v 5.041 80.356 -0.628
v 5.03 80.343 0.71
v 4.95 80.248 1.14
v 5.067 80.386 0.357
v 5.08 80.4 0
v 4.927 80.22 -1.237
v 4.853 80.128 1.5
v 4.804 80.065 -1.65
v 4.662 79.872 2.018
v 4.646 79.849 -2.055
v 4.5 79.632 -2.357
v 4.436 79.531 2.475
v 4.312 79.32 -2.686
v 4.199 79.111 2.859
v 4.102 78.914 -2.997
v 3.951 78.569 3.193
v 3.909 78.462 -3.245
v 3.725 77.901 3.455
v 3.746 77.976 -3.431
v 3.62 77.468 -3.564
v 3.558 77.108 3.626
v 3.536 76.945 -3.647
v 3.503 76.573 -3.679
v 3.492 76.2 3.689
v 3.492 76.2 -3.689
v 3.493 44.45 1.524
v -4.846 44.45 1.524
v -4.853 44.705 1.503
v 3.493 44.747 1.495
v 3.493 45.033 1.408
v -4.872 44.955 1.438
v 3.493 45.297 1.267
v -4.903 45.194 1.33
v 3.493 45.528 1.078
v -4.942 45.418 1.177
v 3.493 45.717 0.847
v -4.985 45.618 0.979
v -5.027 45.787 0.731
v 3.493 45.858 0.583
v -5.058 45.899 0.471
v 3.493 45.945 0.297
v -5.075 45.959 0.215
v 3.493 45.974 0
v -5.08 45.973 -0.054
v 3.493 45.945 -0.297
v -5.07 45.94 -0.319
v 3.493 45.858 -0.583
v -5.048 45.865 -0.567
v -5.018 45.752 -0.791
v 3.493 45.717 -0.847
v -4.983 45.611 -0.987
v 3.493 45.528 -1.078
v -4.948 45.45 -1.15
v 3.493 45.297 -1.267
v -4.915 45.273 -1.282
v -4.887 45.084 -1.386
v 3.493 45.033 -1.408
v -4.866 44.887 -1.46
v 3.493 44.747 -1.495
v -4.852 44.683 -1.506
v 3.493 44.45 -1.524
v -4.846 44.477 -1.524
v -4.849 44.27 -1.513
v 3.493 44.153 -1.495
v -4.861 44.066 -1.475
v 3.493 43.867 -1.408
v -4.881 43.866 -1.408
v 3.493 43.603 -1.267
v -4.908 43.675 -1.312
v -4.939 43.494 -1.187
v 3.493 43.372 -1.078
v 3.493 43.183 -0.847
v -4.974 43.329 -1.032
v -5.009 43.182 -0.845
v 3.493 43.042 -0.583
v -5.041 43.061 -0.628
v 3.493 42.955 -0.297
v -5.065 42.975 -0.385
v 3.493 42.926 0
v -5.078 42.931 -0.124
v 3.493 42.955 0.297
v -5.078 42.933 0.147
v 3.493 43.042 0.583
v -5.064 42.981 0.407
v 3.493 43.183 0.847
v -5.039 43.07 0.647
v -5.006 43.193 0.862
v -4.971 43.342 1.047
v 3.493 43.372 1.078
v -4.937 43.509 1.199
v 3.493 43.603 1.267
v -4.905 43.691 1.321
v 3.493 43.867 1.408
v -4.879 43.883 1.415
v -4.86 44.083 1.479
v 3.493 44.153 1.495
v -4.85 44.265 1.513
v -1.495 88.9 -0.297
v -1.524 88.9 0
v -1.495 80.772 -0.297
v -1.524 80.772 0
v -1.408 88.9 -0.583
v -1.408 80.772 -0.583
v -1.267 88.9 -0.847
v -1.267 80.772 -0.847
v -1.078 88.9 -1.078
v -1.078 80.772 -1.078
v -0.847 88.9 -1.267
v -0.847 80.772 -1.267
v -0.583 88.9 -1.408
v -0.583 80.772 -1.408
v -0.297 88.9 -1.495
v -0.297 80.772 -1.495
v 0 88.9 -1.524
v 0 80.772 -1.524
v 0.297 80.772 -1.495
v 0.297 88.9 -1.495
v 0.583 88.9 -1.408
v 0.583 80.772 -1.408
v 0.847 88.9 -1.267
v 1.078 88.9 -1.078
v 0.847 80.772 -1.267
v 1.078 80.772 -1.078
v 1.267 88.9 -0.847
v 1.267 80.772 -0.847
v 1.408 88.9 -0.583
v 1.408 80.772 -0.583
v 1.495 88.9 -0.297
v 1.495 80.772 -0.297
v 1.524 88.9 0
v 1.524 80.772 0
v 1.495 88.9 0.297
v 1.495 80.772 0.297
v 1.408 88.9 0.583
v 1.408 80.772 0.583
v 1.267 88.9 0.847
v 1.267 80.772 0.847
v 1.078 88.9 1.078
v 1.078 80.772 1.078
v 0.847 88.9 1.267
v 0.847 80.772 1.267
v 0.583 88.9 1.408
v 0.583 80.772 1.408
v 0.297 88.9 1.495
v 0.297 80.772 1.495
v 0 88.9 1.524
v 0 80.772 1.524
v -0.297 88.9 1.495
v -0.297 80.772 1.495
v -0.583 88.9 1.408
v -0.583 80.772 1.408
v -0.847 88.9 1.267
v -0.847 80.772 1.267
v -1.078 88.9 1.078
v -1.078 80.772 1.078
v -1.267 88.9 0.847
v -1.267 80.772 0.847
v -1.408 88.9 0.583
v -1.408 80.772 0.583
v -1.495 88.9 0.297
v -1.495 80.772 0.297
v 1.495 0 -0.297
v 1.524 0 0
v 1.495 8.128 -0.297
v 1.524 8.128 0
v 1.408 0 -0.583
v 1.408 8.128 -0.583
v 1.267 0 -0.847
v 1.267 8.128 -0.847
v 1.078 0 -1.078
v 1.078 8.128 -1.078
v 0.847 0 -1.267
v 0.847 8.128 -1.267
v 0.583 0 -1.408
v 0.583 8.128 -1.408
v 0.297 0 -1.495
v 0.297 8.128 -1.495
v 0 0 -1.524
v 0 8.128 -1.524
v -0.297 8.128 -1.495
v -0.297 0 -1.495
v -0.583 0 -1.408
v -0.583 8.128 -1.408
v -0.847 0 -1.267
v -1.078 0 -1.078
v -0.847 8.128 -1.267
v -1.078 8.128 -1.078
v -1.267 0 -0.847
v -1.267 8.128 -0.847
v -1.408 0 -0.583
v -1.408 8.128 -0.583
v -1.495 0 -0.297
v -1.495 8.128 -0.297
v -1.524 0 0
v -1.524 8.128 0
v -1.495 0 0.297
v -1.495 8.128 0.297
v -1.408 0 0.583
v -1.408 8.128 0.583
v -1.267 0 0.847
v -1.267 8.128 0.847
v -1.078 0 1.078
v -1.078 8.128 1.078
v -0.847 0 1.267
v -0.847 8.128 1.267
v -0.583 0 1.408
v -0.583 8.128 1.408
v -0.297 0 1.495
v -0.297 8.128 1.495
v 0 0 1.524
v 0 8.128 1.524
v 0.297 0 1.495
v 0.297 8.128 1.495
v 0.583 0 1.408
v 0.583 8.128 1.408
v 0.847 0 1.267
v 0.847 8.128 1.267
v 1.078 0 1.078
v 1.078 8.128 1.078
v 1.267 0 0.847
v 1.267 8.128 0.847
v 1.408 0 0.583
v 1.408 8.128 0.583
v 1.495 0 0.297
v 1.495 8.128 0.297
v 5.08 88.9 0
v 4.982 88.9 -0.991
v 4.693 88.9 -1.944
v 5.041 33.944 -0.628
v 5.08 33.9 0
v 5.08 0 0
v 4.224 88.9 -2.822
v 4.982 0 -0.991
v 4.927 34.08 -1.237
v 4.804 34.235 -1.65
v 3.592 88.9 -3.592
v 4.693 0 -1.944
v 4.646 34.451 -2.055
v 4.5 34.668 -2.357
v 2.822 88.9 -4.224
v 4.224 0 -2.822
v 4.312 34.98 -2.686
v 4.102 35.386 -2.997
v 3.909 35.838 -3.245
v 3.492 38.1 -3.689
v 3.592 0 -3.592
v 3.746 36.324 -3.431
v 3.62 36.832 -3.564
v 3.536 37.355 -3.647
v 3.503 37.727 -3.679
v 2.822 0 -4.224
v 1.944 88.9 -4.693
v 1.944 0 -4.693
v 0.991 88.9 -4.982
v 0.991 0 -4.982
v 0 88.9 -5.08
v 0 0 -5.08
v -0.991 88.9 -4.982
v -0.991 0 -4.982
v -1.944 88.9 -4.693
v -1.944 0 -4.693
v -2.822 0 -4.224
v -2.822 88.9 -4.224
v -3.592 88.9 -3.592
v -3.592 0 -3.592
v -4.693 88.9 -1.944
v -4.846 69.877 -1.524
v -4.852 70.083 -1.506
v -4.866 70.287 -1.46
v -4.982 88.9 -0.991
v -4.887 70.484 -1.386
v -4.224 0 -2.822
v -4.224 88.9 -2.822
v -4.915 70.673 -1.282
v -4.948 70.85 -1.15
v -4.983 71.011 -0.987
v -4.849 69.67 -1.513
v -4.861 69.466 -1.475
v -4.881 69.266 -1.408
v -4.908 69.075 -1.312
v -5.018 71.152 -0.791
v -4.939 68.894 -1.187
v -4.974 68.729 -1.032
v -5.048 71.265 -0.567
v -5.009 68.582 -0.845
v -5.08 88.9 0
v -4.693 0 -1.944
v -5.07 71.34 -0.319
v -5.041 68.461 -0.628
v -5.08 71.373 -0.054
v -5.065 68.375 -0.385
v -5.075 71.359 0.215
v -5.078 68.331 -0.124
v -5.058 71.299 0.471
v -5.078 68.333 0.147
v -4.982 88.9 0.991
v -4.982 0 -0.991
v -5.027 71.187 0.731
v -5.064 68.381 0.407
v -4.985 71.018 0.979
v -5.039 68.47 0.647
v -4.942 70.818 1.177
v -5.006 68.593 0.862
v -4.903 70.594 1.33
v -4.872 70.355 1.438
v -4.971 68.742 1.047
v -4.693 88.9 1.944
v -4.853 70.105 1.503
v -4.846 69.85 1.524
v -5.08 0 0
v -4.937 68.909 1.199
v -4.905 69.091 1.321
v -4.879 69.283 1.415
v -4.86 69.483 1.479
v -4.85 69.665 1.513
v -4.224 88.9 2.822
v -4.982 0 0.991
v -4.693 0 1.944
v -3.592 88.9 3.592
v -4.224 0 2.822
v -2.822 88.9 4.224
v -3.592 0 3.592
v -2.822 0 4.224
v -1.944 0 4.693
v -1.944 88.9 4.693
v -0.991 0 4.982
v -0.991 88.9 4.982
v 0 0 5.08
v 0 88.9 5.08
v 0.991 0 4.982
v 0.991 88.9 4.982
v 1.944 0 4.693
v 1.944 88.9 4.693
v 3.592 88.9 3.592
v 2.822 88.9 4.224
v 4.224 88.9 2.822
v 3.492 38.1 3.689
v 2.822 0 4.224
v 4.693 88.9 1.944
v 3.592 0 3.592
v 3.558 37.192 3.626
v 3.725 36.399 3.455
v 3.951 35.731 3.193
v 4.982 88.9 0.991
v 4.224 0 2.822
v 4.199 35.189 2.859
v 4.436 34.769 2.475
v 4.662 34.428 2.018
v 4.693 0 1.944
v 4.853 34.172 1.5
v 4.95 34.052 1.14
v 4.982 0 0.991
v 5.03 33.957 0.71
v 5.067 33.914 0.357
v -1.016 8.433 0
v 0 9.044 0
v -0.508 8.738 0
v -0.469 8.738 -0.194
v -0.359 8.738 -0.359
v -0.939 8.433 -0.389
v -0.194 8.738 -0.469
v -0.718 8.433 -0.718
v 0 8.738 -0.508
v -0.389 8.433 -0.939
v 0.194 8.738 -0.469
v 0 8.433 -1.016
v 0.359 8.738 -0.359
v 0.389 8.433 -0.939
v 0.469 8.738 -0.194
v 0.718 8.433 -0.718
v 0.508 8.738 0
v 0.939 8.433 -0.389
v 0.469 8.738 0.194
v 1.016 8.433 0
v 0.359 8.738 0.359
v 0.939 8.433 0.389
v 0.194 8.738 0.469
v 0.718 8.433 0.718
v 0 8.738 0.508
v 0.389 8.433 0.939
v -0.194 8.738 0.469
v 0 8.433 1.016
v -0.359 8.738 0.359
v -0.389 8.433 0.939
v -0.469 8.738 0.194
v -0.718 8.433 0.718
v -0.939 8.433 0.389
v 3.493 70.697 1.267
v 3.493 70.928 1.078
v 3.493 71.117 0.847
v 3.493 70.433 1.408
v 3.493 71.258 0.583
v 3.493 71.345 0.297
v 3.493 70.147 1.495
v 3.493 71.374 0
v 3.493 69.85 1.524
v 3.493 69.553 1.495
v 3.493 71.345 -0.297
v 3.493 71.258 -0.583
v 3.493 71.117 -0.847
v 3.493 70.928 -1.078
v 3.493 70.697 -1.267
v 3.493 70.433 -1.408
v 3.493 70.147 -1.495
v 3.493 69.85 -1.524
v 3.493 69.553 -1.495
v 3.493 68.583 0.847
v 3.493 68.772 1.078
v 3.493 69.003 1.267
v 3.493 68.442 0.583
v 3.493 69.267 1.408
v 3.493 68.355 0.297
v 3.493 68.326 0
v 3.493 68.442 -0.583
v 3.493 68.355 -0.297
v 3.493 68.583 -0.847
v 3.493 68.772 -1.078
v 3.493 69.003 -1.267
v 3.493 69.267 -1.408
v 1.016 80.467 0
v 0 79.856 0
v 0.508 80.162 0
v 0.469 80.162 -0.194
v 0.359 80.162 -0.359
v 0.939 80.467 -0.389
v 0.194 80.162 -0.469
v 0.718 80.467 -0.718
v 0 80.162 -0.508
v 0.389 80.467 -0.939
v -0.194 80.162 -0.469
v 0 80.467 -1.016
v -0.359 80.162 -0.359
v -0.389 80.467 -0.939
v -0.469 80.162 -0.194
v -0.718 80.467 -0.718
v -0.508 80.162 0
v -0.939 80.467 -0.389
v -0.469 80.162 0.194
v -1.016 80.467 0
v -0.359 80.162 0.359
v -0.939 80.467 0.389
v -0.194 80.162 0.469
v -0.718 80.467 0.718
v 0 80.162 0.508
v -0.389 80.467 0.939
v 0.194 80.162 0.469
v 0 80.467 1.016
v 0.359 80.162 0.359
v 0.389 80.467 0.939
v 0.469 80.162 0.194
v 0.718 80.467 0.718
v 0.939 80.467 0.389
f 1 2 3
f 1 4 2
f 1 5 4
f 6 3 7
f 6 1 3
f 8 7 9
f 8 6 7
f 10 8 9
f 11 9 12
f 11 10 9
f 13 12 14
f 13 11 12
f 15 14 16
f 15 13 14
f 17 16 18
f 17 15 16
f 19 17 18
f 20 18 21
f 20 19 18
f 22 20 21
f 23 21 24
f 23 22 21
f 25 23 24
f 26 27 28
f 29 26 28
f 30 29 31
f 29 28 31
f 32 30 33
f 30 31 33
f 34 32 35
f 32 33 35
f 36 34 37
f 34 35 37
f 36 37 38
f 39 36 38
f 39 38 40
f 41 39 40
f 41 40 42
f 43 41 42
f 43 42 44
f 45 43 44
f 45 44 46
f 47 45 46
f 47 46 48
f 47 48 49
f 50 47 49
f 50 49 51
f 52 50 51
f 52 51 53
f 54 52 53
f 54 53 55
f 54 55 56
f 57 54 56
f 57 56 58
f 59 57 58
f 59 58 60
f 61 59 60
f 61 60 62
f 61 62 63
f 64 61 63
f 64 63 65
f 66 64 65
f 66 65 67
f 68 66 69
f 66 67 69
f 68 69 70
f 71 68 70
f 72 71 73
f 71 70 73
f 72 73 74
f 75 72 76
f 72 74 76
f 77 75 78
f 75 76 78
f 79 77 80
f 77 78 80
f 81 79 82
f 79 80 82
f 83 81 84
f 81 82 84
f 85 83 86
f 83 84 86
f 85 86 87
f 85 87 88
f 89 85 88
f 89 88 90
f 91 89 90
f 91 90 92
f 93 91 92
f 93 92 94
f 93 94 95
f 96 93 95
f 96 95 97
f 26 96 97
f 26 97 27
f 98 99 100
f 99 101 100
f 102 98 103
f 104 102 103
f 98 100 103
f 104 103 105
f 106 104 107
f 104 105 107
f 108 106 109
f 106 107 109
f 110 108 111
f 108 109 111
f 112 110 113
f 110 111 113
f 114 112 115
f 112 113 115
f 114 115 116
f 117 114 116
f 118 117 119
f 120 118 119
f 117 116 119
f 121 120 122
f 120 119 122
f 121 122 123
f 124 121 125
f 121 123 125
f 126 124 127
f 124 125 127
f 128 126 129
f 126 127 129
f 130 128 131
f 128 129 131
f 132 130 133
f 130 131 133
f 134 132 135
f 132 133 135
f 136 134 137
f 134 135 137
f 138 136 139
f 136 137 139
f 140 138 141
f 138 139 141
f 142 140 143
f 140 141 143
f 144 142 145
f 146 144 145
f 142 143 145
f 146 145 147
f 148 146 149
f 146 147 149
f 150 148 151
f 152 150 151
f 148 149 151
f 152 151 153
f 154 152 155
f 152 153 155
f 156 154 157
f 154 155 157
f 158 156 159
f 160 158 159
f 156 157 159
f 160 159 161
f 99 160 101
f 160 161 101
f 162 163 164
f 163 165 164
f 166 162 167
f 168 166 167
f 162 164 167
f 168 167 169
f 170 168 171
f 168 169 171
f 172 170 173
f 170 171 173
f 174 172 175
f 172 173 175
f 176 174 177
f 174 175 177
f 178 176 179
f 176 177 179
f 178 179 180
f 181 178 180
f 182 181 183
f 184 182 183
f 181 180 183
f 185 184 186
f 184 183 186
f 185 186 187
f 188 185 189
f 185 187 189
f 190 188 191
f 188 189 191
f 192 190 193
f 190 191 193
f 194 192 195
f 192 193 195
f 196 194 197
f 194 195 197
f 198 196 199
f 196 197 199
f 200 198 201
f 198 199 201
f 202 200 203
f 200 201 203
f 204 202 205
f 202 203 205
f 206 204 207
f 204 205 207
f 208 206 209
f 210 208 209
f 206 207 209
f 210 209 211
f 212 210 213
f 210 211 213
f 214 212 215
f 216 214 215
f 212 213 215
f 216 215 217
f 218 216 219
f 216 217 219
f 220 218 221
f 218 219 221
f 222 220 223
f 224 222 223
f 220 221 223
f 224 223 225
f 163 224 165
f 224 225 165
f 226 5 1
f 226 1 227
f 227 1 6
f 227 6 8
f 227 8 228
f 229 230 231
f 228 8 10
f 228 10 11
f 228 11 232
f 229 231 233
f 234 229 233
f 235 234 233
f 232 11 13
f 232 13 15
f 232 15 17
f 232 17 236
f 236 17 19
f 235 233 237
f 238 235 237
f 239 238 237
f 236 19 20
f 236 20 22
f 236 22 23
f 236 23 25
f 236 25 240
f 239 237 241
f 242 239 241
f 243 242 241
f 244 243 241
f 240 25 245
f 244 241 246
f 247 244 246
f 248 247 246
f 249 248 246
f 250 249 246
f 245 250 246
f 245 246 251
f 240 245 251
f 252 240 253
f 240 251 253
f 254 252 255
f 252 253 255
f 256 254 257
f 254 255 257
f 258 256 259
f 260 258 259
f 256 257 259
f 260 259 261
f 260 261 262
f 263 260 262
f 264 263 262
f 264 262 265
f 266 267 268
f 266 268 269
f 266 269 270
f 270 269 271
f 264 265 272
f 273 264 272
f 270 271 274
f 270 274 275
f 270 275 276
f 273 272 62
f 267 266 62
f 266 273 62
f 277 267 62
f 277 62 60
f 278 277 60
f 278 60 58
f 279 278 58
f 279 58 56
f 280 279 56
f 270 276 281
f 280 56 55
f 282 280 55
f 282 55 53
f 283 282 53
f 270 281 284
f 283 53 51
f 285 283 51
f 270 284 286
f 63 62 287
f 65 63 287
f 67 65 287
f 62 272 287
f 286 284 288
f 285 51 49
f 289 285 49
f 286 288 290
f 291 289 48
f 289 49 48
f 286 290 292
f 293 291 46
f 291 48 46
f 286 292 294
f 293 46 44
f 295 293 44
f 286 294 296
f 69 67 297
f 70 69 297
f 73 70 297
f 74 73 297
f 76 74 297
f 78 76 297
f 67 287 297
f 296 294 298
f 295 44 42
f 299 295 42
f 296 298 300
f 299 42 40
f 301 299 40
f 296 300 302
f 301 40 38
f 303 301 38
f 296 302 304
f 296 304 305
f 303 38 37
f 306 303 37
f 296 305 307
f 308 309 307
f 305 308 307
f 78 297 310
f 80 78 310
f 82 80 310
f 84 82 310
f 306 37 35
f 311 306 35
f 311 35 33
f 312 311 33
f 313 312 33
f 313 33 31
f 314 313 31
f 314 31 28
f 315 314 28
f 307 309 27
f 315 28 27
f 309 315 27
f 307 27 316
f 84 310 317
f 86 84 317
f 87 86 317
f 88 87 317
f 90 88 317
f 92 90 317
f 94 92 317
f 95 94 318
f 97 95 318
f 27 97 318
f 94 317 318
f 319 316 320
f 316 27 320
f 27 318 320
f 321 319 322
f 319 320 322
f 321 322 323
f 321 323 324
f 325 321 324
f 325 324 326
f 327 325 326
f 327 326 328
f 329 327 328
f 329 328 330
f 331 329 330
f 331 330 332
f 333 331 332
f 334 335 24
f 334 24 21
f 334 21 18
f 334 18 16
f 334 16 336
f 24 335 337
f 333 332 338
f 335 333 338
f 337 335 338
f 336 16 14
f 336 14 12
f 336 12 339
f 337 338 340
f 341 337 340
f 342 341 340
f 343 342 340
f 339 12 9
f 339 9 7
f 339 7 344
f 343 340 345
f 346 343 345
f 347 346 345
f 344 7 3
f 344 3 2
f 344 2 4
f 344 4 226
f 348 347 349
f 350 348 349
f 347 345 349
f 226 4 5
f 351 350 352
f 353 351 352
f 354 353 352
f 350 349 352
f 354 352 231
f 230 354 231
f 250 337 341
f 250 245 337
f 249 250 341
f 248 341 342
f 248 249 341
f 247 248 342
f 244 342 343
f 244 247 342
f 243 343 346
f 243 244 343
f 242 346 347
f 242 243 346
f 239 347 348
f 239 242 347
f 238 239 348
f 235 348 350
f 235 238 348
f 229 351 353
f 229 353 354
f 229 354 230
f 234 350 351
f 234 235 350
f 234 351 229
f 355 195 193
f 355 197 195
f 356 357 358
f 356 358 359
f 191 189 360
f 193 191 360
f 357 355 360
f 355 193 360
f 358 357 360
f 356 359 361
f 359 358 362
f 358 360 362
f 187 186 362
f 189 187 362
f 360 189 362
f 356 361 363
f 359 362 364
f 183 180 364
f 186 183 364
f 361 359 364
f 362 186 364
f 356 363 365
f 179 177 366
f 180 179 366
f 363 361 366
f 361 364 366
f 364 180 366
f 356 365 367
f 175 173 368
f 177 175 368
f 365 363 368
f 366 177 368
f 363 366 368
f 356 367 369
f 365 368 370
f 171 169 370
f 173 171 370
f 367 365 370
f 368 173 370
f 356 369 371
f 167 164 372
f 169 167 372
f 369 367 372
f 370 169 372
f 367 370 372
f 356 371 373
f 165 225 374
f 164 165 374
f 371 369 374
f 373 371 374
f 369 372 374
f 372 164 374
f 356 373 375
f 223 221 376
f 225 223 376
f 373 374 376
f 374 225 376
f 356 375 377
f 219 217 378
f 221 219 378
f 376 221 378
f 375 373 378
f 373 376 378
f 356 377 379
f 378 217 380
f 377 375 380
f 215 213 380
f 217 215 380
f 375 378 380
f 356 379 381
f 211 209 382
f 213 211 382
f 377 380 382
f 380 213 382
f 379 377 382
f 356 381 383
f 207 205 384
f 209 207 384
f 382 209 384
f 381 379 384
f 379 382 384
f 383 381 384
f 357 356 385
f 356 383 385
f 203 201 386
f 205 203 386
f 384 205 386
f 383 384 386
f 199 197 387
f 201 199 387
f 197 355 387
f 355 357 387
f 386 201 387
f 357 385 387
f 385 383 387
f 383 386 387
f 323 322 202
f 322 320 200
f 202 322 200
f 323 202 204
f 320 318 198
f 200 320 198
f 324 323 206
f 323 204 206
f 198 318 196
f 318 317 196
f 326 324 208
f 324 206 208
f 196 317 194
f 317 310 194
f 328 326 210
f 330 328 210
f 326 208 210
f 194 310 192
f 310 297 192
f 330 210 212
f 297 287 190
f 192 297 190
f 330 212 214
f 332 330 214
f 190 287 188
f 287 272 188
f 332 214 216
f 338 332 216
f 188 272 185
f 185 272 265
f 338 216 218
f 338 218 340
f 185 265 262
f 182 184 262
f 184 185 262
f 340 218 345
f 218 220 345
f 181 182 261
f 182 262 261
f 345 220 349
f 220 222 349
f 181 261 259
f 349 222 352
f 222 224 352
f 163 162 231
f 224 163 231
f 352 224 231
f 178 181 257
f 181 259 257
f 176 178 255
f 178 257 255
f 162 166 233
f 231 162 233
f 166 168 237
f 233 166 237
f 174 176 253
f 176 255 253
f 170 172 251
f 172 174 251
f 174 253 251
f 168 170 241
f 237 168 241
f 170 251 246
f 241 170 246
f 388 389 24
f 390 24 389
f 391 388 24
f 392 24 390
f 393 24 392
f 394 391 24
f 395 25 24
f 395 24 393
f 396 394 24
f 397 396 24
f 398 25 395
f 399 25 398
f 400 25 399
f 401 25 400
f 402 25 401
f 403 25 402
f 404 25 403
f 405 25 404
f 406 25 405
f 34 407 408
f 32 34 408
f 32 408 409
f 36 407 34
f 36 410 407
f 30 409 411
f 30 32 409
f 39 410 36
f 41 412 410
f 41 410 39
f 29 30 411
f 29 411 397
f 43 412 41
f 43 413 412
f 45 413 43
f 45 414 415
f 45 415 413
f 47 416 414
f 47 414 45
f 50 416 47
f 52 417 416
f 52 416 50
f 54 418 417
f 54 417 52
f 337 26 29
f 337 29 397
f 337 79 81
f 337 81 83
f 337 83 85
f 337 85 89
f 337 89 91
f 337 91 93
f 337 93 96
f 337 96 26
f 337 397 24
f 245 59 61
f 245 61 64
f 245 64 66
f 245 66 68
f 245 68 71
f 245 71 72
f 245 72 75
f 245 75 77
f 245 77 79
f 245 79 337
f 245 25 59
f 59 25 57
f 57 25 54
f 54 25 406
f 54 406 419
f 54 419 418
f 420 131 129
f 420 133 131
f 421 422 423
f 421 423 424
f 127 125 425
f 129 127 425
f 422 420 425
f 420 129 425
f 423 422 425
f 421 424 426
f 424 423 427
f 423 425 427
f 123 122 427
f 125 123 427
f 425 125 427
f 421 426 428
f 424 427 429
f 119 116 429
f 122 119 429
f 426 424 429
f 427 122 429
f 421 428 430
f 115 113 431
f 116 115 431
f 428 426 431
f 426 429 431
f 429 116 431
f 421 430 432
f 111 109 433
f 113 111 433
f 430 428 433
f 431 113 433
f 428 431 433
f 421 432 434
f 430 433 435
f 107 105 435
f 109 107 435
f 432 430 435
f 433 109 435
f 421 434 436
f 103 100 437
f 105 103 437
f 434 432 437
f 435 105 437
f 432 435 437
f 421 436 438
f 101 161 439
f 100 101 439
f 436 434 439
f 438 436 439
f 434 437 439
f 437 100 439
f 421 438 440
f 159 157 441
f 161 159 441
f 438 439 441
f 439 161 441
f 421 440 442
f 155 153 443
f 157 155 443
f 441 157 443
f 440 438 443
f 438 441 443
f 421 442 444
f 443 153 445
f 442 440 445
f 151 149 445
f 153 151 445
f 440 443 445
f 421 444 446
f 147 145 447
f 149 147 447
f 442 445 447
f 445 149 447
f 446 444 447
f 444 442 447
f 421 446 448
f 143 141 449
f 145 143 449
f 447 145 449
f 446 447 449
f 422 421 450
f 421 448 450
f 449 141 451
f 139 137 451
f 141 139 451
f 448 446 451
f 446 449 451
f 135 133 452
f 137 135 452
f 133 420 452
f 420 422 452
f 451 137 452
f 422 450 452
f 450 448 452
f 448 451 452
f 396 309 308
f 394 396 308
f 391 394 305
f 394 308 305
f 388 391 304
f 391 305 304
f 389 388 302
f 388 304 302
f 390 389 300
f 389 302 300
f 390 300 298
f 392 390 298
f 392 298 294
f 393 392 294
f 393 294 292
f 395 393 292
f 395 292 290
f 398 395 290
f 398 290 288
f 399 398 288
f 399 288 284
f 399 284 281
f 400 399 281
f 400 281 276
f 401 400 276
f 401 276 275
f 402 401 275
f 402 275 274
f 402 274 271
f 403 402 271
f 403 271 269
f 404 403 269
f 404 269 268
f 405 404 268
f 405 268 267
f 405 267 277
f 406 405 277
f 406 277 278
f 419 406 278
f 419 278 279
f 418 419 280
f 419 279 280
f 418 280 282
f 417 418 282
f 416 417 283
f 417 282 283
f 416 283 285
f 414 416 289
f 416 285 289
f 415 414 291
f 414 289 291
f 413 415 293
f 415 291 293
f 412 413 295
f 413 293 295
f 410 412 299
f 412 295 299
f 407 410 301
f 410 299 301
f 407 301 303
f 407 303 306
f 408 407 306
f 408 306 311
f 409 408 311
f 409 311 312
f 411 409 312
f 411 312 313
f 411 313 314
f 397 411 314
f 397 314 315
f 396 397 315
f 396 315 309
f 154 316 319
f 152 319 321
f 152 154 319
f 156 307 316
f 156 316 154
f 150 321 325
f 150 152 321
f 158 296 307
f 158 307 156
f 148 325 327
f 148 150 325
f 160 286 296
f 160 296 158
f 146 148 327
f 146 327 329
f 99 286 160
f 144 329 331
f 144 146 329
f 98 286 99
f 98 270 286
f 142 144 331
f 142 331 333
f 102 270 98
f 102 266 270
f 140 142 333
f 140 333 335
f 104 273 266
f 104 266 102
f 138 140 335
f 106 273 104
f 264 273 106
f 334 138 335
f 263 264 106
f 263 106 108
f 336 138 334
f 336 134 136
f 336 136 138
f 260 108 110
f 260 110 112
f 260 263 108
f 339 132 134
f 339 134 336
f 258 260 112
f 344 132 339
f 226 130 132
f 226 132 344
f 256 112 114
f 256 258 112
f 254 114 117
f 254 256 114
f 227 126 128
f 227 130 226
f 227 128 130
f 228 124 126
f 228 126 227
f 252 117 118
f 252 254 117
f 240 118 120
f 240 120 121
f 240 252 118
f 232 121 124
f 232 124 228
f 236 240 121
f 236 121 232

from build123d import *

# Parameters (mm, degrees)
SKETCH1_R                            = 5.08
BOSS_EXTRUDE1_DEPTH                  = 88.9
TAPPED_HOLE_FOR_4_40_HELICOIL1_D     = 3.048
TAPPED_HOLE_FOR_4_40_HELICOIL1_DEPTH = 8.128
TAPPED_HOLE_FOR_4_40_HELICOIL1_TIP   = 0.915711583
TAPPED_HOLE_FOR_4_40_HELICOIL2_D     = 3.048
TAPPED_HOLE_FOR_4_40_HELICOIL2_DEPTH = 8.128
TAPPED_HOLE_FOR_4_40_HELICOIL2_TIP   = 0.915711583
CUT_EXTRUDE1_DEPTH                   = 6.08
CUT_EXTRUDE1_DEPTH_BACK              = 6.08
TAPPED_HOLE_FOR_4_40_HELICOIL3_D     = 3.048


with BuildPart() as part:
    # Sketch1 → Boss-Extrude1 (new body)
    with BuildSketch(Plane(origin=(0, 0, 0), x_dir=(1, 0, 0), z_dir=(0, 1, 0))):
        Circle(SKETCH1_R)
    extrude(amount=BOSS_EXTRUDE1_DEPTH)

    # Tapped Hole for #4-40 Helicoil1
    with Locations(Plane(origin=(0, 88.9, 0), x_dir=(1, 0, 0), z_dir=(0, 1, 0))):
        with Locations((0, 0)):
            Hole(TAPPED_HOLE_FOR_4_40_HELICOIL1_D / 2, depth=TAPPED_HOLE_FOR_4_40_HELICOIL1_DEPTH)
            with Locations((0, 0, -(TAPPED_HOLE_FOR_4_40_HELICOIL1_DEPTH + TAPPED_HOLE_FOR_4_40_HELICOIL1_TIP / 2))):  # 118° drill point
                Cone(0, TAPPED_HOLE_FOR_4_40_HELICOIL1_D / 2, TAPPED_HOLE_FOR_4_40_HELICOIL1_TIP, mode=Mode.SUBTRACT)

    # Tapped Hole for #4-40 Helicoil2
    with Locations(Plane(origin=(0, 0, 0), x_dir=(-1, 0, 0), z_dir=(0, -1, 0))):
        with Locations((0, 0)):
            Hole(TAPPED_HOLE_FOR_4_40_HELICOIL2_D / 2, depth=TAPPED_HOLE_FOR_4_40_HELICOIL2_DEPTH)
            with Locations((0, 0, -(TAPPED_HOLE_FOR_4_40_HELICOIL2_DEPTH + TAPPED_HOLE_FOR_4_40_HELICOIL2_TIP / 2))):  # 118° drill point
                Cone(0, TAPPED_HOLE_FOR_4_40_HELICOIL2_D / 2, TAPPED_HOLE_FOR_4_40_HELICOIL2_TIP, mode=Mode.SUBTRACT)

    # Sketch8 → Cut-Extrude1 (cut, two sides)
    with BuildSketch(Plane.XY) as cut_extrude1_sk:
        with BuildLine():
            ThreePointArc((5.08, 80.400130206), (3.902618898, 78.44506403), (3.4925, 76.2))
            Line((3.4925, 76.2), (3.4925, 38.1))
            ThreePointArc((3.4925, 38.1), (3.902618898, 35.85493597), (5.08, 33.899869794))
            Line((5.08, 33.899869794), (5.08, 80.400130206))
        make_face()
    extrude(amount=CUT_EXTRUDE1_DEPTH, mode=Mode.SUBTRACT)
    extrude(cut_extrude1_sk.sketch, amount=-CUT_EXTRUDE1_DEPTH_BACK, mode=Mode.SUBTRACT)

    # Tapped Hole for #4-40 Helicoil3 (through all)
    with Locations(Plane(origin=(3.4925, 0, 0), x_dir=(0, 0, -1), z_dir=(1, 0, 0))):
        with Locations((0, 69.85), (0, 44.45)):
            Hole(TAPPED_HOLE_FOR_4_40_HELICOIL3_D / 2)


solid = part.part
